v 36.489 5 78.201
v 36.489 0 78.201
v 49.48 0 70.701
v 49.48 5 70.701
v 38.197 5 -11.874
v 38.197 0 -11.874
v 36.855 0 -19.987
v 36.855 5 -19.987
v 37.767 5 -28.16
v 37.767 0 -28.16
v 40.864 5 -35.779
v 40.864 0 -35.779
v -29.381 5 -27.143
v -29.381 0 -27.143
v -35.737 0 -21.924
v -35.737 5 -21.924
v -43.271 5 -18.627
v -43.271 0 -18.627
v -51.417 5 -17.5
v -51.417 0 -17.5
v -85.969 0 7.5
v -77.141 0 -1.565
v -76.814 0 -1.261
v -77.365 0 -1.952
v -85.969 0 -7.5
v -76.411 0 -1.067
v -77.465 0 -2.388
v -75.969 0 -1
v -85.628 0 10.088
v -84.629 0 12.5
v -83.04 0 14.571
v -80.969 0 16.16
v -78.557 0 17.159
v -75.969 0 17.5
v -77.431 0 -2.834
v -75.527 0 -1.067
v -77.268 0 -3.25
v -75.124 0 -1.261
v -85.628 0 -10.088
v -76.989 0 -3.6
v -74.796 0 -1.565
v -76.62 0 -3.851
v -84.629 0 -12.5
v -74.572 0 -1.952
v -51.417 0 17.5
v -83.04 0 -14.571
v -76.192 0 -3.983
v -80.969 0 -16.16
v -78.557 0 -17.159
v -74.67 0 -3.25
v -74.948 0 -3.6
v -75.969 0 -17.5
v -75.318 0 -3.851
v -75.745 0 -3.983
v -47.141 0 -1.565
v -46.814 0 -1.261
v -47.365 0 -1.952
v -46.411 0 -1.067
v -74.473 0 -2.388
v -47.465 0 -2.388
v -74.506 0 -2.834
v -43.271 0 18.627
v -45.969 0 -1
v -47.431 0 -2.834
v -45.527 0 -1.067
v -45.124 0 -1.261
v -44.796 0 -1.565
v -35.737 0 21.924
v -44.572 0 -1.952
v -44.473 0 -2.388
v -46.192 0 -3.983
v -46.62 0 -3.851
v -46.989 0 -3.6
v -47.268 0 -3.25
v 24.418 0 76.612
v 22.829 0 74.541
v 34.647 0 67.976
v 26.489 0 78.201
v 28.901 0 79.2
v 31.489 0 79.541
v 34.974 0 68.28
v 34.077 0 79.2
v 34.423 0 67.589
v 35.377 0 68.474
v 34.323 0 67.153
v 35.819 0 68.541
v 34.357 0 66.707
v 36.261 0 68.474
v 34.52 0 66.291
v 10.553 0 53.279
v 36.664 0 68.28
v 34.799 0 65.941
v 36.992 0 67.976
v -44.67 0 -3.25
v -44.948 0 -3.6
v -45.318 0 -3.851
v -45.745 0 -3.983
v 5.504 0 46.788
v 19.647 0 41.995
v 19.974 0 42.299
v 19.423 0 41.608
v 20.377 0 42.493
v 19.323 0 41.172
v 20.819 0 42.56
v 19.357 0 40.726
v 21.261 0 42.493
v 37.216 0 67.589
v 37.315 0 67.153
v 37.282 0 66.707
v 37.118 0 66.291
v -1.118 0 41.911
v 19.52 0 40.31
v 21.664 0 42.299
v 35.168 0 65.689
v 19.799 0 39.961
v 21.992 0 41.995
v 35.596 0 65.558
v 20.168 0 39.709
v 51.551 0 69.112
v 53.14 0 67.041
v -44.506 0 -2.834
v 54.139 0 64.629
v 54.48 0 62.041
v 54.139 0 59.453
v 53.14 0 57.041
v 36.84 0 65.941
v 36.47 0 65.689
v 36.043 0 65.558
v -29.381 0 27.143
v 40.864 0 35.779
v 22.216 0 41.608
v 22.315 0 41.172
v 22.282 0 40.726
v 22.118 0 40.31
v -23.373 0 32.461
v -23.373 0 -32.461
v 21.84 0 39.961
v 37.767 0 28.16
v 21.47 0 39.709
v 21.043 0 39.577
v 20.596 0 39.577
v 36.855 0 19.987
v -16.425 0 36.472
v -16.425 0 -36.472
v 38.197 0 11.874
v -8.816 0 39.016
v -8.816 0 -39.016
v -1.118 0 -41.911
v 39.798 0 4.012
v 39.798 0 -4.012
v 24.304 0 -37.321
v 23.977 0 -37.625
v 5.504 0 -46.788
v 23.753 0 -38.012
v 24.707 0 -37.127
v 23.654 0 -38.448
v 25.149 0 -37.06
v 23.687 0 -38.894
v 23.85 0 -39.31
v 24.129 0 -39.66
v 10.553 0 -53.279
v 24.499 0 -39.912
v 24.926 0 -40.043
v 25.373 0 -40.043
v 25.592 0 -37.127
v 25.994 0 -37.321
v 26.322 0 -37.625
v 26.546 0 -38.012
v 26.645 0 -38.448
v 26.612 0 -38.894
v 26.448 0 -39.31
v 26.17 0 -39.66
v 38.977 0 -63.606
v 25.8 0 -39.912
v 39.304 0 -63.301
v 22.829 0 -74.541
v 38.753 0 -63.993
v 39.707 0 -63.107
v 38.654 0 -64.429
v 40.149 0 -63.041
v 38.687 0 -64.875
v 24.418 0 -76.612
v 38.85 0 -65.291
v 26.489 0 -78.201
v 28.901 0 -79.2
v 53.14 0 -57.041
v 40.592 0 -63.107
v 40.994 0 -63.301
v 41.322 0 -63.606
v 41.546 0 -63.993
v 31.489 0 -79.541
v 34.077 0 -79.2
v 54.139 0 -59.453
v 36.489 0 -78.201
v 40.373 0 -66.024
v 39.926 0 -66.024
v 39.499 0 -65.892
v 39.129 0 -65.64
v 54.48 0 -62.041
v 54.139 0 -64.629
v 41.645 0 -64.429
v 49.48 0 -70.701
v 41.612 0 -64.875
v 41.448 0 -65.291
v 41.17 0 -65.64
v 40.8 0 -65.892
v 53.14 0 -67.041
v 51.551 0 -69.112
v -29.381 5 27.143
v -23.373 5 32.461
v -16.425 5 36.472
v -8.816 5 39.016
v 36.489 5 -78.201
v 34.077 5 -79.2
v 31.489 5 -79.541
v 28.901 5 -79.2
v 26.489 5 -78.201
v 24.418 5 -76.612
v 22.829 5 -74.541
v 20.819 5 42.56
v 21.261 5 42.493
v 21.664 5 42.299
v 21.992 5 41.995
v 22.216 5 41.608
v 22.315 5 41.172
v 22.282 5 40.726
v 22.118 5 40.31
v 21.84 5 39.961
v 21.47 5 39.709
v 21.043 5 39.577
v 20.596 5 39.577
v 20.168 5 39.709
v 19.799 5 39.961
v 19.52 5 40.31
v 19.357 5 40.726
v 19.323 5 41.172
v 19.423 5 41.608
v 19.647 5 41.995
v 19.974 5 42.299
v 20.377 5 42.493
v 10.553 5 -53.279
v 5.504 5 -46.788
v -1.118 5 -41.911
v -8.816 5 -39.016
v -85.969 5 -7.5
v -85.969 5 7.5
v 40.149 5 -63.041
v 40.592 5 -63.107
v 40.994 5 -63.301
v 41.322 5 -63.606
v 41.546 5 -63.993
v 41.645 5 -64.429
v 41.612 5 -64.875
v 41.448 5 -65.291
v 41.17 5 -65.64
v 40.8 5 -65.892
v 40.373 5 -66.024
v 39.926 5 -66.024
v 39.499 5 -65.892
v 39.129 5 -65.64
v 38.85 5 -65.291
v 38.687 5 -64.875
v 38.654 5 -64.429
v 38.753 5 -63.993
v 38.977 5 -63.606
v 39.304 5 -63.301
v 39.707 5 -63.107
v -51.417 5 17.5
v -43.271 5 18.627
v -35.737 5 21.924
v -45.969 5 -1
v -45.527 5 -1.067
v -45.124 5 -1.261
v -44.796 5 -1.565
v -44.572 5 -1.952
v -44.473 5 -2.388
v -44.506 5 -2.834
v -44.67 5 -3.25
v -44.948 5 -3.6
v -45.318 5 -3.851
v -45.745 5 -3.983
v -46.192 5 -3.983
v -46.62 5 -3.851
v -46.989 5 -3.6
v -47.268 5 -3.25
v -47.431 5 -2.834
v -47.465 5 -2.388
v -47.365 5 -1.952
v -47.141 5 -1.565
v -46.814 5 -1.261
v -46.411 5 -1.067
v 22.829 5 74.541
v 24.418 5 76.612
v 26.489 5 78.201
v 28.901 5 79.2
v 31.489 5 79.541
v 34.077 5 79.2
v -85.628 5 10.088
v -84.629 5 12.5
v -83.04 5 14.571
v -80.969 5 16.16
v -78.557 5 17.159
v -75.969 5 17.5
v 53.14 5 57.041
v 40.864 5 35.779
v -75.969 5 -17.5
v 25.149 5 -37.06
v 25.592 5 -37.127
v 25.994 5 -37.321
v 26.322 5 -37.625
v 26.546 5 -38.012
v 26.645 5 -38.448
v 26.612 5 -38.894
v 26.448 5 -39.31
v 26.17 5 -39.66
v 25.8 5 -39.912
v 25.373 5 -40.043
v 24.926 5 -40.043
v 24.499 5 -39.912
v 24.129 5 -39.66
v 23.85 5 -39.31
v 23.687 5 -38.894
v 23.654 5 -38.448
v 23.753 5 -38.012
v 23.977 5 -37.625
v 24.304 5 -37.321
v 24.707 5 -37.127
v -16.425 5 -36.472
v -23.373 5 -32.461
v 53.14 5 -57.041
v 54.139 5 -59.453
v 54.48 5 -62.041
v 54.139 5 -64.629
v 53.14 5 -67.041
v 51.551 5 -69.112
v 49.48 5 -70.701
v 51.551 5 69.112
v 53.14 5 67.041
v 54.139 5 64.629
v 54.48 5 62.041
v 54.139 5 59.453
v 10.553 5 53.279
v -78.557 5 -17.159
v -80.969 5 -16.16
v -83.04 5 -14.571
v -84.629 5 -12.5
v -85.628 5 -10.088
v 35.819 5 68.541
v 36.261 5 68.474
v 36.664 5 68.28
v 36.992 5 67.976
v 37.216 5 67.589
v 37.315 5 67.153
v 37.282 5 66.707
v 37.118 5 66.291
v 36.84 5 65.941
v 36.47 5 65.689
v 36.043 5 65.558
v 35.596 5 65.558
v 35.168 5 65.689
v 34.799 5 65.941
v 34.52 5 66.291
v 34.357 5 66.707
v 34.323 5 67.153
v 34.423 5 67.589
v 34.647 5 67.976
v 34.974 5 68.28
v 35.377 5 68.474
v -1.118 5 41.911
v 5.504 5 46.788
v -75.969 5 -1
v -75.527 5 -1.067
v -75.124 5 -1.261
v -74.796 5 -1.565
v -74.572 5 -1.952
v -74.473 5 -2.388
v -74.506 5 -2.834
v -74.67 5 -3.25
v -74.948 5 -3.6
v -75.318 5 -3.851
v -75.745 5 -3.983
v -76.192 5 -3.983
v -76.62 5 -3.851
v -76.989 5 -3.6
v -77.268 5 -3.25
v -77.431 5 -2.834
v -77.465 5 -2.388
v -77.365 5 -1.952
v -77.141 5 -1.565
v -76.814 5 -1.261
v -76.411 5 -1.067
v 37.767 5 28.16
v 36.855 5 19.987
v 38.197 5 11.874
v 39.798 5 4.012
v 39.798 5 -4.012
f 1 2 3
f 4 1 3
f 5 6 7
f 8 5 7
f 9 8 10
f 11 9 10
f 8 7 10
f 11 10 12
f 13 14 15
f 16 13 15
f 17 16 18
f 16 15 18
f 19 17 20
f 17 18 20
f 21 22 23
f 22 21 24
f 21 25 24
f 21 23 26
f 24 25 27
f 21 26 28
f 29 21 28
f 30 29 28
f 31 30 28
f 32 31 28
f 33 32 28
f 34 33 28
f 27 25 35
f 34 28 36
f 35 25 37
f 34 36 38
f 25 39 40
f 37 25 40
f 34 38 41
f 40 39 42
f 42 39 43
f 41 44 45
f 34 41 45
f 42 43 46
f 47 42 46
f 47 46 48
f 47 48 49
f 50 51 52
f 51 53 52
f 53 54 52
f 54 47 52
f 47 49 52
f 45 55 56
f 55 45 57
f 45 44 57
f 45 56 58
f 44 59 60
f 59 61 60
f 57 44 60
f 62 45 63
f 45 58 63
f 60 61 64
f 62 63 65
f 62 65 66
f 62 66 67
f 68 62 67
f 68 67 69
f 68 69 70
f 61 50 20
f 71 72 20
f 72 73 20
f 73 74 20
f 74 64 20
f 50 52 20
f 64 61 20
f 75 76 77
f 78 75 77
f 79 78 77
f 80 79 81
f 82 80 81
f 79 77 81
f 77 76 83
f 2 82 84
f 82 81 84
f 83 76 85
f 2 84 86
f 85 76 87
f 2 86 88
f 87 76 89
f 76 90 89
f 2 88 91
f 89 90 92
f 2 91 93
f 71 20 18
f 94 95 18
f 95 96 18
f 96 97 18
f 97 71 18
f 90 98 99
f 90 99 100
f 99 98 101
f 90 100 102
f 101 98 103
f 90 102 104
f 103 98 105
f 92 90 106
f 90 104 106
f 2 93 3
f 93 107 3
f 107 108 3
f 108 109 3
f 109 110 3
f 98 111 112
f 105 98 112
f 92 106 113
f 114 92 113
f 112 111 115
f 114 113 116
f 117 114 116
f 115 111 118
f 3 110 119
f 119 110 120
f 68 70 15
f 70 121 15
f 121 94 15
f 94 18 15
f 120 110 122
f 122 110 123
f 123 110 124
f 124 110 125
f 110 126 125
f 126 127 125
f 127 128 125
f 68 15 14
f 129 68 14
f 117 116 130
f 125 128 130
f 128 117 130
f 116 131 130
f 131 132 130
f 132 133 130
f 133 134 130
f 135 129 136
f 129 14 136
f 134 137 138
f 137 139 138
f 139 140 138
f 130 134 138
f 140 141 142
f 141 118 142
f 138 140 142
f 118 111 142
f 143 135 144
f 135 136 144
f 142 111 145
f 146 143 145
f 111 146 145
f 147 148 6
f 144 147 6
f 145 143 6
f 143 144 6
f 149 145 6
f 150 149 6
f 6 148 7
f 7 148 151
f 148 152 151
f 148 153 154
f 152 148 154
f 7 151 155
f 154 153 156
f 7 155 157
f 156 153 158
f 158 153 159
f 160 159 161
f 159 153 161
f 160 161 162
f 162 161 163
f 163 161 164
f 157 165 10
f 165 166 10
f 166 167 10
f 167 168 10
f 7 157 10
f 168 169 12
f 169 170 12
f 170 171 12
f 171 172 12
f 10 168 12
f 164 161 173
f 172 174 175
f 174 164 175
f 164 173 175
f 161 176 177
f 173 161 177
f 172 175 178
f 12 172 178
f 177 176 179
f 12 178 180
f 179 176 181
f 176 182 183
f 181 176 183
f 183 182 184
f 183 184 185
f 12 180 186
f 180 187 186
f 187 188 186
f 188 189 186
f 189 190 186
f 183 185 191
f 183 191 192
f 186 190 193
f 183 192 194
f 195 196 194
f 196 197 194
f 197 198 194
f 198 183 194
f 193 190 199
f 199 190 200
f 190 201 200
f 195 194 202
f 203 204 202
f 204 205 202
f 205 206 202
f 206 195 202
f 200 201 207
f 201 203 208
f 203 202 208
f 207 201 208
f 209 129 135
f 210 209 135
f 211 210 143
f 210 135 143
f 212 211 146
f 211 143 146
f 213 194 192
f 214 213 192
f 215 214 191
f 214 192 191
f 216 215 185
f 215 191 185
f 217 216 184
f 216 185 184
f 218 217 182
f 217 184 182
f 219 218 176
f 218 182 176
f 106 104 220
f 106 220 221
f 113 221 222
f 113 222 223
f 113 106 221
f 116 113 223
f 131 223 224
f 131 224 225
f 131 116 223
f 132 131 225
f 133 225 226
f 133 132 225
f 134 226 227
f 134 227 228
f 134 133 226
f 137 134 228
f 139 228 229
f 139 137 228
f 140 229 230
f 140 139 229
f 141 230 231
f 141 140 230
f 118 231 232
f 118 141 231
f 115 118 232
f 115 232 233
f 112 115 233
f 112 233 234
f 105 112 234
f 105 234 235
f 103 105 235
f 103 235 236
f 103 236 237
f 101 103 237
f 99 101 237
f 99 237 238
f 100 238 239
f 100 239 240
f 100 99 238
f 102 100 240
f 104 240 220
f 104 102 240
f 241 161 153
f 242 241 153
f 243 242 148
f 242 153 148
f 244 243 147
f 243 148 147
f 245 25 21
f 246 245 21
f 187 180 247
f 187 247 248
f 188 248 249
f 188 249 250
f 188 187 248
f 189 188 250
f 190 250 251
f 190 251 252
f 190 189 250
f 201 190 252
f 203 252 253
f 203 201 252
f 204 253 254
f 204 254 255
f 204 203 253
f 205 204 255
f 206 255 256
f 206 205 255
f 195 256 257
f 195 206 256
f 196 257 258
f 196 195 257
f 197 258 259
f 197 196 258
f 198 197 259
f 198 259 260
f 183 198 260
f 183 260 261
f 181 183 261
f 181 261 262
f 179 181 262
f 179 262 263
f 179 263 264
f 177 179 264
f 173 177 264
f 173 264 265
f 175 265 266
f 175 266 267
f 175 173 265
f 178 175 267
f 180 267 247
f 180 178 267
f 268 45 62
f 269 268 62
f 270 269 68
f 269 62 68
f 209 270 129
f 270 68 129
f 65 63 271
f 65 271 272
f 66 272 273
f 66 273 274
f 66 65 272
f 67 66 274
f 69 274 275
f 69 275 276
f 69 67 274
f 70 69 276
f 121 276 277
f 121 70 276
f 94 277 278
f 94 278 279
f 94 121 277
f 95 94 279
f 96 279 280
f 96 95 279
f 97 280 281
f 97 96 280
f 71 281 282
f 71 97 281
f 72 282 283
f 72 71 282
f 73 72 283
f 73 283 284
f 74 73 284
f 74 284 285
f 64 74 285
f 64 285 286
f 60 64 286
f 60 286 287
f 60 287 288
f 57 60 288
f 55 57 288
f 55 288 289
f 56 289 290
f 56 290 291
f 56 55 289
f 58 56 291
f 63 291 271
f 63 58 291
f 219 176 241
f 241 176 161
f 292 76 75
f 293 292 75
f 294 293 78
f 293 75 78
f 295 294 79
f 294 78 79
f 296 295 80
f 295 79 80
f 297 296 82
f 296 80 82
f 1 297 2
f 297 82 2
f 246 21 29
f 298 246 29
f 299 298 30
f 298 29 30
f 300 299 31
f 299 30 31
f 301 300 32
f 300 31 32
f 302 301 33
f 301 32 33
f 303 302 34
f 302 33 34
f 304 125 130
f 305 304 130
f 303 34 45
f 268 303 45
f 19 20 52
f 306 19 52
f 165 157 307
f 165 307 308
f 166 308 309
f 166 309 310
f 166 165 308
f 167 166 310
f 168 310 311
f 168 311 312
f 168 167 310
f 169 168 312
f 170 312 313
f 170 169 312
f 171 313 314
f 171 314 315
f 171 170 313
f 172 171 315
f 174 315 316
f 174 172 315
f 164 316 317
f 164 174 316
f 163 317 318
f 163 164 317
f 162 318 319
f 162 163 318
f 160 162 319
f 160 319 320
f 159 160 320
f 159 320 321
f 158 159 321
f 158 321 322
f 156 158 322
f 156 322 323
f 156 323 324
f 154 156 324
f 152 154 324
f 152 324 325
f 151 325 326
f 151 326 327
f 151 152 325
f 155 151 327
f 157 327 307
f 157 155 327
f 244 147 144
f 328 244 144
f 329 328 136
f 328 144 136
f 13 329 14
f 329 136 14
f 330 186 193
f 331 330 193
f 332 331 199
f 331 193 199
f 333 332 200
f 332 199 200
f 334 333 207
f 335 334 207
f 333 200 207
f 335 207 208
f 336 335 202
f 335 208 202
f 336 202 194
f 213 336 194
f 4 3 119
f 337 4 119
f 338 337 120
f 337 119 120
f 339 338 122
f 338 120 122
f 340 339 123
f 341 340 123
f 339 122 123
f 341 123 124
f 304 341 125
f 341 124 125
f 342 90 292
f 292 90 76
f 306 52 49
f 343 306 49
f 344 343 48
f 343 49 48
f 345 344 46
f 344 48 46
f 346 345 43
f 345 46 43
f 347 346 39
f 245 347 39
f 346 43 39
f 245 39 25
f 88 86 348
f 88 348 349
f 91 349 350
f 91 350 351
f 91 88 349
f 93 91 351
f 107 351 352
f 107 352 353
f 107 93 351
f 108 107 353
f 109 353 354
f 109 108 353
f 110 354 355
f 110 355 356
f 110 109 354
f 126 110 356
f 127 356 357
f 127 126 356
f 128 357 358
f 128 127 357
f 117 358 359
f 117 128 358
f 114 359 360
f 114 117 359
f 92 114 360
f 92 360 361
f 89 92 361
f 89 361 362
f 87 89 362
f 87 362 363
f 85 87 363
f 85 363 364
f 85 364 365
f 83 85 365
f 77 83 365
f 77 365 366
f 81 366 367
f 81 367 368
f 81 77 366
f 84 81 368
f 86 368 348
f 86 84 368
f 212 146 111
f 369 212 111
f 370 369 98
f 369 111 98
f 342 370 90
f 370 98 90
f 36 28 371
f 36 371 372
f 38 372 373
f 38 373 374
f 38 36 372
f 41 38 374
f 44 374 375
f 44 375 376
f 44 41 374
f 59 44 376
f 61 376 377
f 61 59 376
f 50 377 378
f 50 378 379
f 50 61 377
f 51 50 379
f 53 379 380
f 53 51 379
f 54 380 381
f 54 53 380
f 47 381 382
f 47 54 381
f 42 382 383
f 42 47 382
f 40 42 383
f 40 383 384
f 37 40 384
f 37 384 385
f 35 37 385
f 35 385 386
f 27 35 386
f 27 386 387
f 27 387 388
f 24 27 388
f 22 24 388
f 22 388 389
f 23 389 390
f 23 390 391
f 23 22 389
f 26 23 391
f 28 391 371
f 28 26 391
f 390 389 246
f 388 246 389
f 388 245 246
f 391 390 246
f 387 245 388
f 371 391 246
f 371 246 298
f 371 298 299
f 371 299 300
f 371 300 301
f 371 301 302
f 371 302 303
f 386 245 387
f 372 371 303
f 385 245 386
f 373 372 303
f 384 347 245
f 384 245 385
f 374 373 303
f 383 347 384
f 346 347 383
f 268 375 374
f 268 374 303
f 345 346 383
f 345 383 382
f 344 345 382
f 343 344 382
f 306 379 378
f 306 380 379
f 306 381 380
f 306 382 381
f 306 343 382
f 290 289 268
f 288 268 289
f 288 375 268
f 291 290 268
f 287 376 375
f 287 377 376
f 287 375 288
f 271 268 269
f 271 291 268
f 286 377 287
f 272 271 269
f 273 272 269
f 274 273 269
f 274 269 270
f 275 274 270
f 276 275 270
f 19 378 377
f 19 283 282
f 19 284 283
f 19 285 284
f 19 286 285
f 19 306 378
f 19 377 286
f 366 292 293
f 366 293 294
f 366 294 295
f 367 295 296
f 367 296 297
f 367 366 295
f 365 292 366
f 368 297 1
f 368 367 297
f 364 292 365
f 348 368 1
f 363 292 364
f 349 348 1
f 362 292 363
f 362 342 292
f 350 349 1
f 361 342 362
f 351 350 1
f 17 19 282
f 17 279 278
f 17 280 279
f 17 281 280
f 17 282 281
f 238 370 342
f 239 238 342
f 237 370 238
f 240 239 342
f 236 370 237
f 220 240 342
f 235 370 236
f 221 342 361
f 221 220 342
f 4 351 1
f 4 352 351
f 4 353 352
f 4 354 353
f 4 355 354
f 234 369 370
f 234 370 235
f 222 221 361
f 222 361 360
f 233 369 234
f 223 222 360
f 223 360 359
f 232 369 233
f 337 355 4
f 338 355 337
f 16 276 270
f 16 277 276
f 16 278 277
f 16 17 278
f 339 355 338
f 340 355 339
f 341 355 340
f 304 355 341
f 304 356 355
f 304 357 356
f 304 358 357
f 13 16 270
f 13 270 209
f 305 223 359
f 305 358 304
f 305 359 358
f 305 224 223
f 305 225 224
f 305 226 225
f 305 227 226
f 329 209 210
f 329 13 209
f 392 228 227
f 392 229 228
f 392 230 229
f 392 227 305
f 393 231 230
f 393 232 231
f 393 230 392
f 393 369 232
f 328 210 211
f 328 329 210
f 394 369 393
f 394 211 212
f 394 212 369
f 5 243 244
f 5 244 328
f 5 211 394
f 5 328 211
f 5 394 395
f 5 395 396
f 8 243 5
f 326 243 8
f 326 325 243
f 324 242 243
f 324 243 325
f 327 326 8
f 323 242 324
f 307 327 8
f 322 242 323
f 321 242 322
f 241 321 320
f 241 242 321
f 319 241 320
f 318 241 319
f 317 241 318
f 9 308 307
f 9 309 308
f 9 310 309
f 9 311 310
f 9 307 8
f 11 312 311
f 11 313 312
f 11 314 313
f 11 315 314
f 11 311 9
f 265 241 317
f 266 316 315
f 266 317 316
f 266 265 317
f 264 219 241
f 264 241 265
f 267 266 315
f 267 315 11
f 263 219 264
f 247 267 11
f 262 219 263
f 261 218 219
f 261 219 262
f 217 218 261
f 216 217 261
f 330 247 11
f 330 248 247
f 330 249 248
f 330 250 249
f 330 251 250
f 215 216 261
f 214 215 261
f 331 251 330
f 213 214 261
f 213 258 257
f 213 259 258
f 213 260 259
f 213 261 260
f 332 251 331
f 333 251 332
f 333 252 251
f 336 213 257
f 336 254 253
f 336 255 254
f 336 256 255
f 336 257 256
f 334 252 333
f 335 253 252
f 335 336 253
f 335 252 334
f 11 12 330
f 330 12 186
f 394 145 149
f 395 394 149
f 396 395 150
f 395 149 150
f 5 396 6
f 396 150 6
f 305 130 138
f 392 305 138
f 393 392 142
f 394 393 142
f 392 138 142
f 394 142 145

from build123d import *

# Parameters (mm, degrees)
ESQUISSE1_R        = 1.5
BOSS_EXTRU_1_DEPTH = 5


with BuildPart() as part:
    # Esquisse1 → Boss.-Extru.1 (new body)
    with BuildSketch(Plane(origin=(0, 0, 0), x_dir=(1, 0, 0), z_dir=(0, 1, 0))):
        with BuildLine():
            Line((40.864149318, 35.778782826), (53.139812779, 57.040855637))
            ThreePointArc((53.139812779, 57.040855637), (54.138817004, 64.629046088), (49.479558741, 70.701109675))
            Line((49.479558741, 70.701109675), (36.489177684, 78.201109675))
            ThreePointArc((36.489177684, 78.201109675), (28.900987233, 79.2001139), (22.828923646, 74.540855637))
            Line((22.828923646, 74.540855637), (10.553260185, 53.278782826))
            ThreePointArc((10.553260185, 53.278782826), (2.360755727, 44.121425984), (-8.815715388, 39.016447329))
            ThreePointArc((-8.815715388, 39.016447329), (-20, 34.641016151), (-29.381376859, 27.142857143))
            ThreePointArc((-29.381376859, 27.142857143), (-39.390653617, 20.016238561), (-51.417409503, 17.5))
            Line((-51.417409503, 17.5), (-75.968736425, 17.5))
            ThreePointArc((-75.968736425, 17.5), (-83.039804237, 14.571067812), (-85.968736425, 7.5))
            Line((-85.968736425, 7.5), (-85.968736425, -7.5))
            ThreePointArc((-85.968736425, -7.5), (-83.039804237, -14.571067812), (-75.968736425, -17.5))
            Line((-75.968736425, -17.5), (-51.417409503, -17.5))
            ThreePointArc((-51.417409503, -17.5), (-39.390653617, -20.016238561), (-29.381376859, -27.142857143))
            ThreePointArc((-29.381376859, -27.142857143), (-20, -34.641016151), (-8.815715388, -39.016447329))
            ThreePointArc((-8.815715388, -39.016447329), (2.360755727, -44.121425984), (10.553260185, -53.278782826))
            Line((10.553260185, -53.278782826), (22.828923646, -74.540855637))
            ThreePointArc((22.828923646, -74.540855637), (28.900987233, -79.2001139), (36.489177684, -78.201109675))
            Line((36.489177684, -78.201109675), (49.479558741, -70.701109675))
            ThreePointArc((49.479558741, -70.701109675), (54.138817004, -64.629046088), (53.139812779, -57.040855637))
            Line((53.139812779, -57.040855637), (40.864149318, -35.778782826))
            ThreePointArc((40.864149318, -35.778782826), (37.02989789, -24.105187424), (38.197092246, -11.873590187))
            ThreePointArc((38.197092246, -11.873590187), (40, 0), (38.197092246, 11.873590187))
            ThreePointArc((38.197092246, 11.873590187), (37.02989789, 24.105187424), (40.864149318, 35.778782826))
        make_face()
        with Locations(Location((-75.968736425, 2.5, 0), (0, 0, 270))):
            Circle(ESQUISSE1_R, mode=Mode.SUBTRACT)
        with Locations(Location((-45.968736425, 2.5, 0), (0, 0, 270))):
            Circle(ESQUISSE1_R, mode=Mode.SUBTRACT)
        with Locations(Location((40.149431722, 64.540855637, 0), (0, 0, 270))):
            Circle(ESQUISSE1_R, mode=Mode.SUBTRACT)
        with Locations(Location((25.149431722, 38.560093524, 0), (0, 0, 270))):
            Circle(ESQUISSE1_R, mode=Mode.SUBTRACT)
        with Locations(Location((35.819304703, -67.040855637, 0), (0, 0, 270))):
            Circle(ESQUISSE1_R, mode=Mode.SUBTRACT)
        with Locations(Location((20.819304703, -41.060093524, 0), (0, 0, 270))):
            Circle(ESQUISSE1_R, mode=Mode.SUBTRACT)
    extrude(amount=BOSS_EXTRU_1_DEPTH)


solid = part.part
